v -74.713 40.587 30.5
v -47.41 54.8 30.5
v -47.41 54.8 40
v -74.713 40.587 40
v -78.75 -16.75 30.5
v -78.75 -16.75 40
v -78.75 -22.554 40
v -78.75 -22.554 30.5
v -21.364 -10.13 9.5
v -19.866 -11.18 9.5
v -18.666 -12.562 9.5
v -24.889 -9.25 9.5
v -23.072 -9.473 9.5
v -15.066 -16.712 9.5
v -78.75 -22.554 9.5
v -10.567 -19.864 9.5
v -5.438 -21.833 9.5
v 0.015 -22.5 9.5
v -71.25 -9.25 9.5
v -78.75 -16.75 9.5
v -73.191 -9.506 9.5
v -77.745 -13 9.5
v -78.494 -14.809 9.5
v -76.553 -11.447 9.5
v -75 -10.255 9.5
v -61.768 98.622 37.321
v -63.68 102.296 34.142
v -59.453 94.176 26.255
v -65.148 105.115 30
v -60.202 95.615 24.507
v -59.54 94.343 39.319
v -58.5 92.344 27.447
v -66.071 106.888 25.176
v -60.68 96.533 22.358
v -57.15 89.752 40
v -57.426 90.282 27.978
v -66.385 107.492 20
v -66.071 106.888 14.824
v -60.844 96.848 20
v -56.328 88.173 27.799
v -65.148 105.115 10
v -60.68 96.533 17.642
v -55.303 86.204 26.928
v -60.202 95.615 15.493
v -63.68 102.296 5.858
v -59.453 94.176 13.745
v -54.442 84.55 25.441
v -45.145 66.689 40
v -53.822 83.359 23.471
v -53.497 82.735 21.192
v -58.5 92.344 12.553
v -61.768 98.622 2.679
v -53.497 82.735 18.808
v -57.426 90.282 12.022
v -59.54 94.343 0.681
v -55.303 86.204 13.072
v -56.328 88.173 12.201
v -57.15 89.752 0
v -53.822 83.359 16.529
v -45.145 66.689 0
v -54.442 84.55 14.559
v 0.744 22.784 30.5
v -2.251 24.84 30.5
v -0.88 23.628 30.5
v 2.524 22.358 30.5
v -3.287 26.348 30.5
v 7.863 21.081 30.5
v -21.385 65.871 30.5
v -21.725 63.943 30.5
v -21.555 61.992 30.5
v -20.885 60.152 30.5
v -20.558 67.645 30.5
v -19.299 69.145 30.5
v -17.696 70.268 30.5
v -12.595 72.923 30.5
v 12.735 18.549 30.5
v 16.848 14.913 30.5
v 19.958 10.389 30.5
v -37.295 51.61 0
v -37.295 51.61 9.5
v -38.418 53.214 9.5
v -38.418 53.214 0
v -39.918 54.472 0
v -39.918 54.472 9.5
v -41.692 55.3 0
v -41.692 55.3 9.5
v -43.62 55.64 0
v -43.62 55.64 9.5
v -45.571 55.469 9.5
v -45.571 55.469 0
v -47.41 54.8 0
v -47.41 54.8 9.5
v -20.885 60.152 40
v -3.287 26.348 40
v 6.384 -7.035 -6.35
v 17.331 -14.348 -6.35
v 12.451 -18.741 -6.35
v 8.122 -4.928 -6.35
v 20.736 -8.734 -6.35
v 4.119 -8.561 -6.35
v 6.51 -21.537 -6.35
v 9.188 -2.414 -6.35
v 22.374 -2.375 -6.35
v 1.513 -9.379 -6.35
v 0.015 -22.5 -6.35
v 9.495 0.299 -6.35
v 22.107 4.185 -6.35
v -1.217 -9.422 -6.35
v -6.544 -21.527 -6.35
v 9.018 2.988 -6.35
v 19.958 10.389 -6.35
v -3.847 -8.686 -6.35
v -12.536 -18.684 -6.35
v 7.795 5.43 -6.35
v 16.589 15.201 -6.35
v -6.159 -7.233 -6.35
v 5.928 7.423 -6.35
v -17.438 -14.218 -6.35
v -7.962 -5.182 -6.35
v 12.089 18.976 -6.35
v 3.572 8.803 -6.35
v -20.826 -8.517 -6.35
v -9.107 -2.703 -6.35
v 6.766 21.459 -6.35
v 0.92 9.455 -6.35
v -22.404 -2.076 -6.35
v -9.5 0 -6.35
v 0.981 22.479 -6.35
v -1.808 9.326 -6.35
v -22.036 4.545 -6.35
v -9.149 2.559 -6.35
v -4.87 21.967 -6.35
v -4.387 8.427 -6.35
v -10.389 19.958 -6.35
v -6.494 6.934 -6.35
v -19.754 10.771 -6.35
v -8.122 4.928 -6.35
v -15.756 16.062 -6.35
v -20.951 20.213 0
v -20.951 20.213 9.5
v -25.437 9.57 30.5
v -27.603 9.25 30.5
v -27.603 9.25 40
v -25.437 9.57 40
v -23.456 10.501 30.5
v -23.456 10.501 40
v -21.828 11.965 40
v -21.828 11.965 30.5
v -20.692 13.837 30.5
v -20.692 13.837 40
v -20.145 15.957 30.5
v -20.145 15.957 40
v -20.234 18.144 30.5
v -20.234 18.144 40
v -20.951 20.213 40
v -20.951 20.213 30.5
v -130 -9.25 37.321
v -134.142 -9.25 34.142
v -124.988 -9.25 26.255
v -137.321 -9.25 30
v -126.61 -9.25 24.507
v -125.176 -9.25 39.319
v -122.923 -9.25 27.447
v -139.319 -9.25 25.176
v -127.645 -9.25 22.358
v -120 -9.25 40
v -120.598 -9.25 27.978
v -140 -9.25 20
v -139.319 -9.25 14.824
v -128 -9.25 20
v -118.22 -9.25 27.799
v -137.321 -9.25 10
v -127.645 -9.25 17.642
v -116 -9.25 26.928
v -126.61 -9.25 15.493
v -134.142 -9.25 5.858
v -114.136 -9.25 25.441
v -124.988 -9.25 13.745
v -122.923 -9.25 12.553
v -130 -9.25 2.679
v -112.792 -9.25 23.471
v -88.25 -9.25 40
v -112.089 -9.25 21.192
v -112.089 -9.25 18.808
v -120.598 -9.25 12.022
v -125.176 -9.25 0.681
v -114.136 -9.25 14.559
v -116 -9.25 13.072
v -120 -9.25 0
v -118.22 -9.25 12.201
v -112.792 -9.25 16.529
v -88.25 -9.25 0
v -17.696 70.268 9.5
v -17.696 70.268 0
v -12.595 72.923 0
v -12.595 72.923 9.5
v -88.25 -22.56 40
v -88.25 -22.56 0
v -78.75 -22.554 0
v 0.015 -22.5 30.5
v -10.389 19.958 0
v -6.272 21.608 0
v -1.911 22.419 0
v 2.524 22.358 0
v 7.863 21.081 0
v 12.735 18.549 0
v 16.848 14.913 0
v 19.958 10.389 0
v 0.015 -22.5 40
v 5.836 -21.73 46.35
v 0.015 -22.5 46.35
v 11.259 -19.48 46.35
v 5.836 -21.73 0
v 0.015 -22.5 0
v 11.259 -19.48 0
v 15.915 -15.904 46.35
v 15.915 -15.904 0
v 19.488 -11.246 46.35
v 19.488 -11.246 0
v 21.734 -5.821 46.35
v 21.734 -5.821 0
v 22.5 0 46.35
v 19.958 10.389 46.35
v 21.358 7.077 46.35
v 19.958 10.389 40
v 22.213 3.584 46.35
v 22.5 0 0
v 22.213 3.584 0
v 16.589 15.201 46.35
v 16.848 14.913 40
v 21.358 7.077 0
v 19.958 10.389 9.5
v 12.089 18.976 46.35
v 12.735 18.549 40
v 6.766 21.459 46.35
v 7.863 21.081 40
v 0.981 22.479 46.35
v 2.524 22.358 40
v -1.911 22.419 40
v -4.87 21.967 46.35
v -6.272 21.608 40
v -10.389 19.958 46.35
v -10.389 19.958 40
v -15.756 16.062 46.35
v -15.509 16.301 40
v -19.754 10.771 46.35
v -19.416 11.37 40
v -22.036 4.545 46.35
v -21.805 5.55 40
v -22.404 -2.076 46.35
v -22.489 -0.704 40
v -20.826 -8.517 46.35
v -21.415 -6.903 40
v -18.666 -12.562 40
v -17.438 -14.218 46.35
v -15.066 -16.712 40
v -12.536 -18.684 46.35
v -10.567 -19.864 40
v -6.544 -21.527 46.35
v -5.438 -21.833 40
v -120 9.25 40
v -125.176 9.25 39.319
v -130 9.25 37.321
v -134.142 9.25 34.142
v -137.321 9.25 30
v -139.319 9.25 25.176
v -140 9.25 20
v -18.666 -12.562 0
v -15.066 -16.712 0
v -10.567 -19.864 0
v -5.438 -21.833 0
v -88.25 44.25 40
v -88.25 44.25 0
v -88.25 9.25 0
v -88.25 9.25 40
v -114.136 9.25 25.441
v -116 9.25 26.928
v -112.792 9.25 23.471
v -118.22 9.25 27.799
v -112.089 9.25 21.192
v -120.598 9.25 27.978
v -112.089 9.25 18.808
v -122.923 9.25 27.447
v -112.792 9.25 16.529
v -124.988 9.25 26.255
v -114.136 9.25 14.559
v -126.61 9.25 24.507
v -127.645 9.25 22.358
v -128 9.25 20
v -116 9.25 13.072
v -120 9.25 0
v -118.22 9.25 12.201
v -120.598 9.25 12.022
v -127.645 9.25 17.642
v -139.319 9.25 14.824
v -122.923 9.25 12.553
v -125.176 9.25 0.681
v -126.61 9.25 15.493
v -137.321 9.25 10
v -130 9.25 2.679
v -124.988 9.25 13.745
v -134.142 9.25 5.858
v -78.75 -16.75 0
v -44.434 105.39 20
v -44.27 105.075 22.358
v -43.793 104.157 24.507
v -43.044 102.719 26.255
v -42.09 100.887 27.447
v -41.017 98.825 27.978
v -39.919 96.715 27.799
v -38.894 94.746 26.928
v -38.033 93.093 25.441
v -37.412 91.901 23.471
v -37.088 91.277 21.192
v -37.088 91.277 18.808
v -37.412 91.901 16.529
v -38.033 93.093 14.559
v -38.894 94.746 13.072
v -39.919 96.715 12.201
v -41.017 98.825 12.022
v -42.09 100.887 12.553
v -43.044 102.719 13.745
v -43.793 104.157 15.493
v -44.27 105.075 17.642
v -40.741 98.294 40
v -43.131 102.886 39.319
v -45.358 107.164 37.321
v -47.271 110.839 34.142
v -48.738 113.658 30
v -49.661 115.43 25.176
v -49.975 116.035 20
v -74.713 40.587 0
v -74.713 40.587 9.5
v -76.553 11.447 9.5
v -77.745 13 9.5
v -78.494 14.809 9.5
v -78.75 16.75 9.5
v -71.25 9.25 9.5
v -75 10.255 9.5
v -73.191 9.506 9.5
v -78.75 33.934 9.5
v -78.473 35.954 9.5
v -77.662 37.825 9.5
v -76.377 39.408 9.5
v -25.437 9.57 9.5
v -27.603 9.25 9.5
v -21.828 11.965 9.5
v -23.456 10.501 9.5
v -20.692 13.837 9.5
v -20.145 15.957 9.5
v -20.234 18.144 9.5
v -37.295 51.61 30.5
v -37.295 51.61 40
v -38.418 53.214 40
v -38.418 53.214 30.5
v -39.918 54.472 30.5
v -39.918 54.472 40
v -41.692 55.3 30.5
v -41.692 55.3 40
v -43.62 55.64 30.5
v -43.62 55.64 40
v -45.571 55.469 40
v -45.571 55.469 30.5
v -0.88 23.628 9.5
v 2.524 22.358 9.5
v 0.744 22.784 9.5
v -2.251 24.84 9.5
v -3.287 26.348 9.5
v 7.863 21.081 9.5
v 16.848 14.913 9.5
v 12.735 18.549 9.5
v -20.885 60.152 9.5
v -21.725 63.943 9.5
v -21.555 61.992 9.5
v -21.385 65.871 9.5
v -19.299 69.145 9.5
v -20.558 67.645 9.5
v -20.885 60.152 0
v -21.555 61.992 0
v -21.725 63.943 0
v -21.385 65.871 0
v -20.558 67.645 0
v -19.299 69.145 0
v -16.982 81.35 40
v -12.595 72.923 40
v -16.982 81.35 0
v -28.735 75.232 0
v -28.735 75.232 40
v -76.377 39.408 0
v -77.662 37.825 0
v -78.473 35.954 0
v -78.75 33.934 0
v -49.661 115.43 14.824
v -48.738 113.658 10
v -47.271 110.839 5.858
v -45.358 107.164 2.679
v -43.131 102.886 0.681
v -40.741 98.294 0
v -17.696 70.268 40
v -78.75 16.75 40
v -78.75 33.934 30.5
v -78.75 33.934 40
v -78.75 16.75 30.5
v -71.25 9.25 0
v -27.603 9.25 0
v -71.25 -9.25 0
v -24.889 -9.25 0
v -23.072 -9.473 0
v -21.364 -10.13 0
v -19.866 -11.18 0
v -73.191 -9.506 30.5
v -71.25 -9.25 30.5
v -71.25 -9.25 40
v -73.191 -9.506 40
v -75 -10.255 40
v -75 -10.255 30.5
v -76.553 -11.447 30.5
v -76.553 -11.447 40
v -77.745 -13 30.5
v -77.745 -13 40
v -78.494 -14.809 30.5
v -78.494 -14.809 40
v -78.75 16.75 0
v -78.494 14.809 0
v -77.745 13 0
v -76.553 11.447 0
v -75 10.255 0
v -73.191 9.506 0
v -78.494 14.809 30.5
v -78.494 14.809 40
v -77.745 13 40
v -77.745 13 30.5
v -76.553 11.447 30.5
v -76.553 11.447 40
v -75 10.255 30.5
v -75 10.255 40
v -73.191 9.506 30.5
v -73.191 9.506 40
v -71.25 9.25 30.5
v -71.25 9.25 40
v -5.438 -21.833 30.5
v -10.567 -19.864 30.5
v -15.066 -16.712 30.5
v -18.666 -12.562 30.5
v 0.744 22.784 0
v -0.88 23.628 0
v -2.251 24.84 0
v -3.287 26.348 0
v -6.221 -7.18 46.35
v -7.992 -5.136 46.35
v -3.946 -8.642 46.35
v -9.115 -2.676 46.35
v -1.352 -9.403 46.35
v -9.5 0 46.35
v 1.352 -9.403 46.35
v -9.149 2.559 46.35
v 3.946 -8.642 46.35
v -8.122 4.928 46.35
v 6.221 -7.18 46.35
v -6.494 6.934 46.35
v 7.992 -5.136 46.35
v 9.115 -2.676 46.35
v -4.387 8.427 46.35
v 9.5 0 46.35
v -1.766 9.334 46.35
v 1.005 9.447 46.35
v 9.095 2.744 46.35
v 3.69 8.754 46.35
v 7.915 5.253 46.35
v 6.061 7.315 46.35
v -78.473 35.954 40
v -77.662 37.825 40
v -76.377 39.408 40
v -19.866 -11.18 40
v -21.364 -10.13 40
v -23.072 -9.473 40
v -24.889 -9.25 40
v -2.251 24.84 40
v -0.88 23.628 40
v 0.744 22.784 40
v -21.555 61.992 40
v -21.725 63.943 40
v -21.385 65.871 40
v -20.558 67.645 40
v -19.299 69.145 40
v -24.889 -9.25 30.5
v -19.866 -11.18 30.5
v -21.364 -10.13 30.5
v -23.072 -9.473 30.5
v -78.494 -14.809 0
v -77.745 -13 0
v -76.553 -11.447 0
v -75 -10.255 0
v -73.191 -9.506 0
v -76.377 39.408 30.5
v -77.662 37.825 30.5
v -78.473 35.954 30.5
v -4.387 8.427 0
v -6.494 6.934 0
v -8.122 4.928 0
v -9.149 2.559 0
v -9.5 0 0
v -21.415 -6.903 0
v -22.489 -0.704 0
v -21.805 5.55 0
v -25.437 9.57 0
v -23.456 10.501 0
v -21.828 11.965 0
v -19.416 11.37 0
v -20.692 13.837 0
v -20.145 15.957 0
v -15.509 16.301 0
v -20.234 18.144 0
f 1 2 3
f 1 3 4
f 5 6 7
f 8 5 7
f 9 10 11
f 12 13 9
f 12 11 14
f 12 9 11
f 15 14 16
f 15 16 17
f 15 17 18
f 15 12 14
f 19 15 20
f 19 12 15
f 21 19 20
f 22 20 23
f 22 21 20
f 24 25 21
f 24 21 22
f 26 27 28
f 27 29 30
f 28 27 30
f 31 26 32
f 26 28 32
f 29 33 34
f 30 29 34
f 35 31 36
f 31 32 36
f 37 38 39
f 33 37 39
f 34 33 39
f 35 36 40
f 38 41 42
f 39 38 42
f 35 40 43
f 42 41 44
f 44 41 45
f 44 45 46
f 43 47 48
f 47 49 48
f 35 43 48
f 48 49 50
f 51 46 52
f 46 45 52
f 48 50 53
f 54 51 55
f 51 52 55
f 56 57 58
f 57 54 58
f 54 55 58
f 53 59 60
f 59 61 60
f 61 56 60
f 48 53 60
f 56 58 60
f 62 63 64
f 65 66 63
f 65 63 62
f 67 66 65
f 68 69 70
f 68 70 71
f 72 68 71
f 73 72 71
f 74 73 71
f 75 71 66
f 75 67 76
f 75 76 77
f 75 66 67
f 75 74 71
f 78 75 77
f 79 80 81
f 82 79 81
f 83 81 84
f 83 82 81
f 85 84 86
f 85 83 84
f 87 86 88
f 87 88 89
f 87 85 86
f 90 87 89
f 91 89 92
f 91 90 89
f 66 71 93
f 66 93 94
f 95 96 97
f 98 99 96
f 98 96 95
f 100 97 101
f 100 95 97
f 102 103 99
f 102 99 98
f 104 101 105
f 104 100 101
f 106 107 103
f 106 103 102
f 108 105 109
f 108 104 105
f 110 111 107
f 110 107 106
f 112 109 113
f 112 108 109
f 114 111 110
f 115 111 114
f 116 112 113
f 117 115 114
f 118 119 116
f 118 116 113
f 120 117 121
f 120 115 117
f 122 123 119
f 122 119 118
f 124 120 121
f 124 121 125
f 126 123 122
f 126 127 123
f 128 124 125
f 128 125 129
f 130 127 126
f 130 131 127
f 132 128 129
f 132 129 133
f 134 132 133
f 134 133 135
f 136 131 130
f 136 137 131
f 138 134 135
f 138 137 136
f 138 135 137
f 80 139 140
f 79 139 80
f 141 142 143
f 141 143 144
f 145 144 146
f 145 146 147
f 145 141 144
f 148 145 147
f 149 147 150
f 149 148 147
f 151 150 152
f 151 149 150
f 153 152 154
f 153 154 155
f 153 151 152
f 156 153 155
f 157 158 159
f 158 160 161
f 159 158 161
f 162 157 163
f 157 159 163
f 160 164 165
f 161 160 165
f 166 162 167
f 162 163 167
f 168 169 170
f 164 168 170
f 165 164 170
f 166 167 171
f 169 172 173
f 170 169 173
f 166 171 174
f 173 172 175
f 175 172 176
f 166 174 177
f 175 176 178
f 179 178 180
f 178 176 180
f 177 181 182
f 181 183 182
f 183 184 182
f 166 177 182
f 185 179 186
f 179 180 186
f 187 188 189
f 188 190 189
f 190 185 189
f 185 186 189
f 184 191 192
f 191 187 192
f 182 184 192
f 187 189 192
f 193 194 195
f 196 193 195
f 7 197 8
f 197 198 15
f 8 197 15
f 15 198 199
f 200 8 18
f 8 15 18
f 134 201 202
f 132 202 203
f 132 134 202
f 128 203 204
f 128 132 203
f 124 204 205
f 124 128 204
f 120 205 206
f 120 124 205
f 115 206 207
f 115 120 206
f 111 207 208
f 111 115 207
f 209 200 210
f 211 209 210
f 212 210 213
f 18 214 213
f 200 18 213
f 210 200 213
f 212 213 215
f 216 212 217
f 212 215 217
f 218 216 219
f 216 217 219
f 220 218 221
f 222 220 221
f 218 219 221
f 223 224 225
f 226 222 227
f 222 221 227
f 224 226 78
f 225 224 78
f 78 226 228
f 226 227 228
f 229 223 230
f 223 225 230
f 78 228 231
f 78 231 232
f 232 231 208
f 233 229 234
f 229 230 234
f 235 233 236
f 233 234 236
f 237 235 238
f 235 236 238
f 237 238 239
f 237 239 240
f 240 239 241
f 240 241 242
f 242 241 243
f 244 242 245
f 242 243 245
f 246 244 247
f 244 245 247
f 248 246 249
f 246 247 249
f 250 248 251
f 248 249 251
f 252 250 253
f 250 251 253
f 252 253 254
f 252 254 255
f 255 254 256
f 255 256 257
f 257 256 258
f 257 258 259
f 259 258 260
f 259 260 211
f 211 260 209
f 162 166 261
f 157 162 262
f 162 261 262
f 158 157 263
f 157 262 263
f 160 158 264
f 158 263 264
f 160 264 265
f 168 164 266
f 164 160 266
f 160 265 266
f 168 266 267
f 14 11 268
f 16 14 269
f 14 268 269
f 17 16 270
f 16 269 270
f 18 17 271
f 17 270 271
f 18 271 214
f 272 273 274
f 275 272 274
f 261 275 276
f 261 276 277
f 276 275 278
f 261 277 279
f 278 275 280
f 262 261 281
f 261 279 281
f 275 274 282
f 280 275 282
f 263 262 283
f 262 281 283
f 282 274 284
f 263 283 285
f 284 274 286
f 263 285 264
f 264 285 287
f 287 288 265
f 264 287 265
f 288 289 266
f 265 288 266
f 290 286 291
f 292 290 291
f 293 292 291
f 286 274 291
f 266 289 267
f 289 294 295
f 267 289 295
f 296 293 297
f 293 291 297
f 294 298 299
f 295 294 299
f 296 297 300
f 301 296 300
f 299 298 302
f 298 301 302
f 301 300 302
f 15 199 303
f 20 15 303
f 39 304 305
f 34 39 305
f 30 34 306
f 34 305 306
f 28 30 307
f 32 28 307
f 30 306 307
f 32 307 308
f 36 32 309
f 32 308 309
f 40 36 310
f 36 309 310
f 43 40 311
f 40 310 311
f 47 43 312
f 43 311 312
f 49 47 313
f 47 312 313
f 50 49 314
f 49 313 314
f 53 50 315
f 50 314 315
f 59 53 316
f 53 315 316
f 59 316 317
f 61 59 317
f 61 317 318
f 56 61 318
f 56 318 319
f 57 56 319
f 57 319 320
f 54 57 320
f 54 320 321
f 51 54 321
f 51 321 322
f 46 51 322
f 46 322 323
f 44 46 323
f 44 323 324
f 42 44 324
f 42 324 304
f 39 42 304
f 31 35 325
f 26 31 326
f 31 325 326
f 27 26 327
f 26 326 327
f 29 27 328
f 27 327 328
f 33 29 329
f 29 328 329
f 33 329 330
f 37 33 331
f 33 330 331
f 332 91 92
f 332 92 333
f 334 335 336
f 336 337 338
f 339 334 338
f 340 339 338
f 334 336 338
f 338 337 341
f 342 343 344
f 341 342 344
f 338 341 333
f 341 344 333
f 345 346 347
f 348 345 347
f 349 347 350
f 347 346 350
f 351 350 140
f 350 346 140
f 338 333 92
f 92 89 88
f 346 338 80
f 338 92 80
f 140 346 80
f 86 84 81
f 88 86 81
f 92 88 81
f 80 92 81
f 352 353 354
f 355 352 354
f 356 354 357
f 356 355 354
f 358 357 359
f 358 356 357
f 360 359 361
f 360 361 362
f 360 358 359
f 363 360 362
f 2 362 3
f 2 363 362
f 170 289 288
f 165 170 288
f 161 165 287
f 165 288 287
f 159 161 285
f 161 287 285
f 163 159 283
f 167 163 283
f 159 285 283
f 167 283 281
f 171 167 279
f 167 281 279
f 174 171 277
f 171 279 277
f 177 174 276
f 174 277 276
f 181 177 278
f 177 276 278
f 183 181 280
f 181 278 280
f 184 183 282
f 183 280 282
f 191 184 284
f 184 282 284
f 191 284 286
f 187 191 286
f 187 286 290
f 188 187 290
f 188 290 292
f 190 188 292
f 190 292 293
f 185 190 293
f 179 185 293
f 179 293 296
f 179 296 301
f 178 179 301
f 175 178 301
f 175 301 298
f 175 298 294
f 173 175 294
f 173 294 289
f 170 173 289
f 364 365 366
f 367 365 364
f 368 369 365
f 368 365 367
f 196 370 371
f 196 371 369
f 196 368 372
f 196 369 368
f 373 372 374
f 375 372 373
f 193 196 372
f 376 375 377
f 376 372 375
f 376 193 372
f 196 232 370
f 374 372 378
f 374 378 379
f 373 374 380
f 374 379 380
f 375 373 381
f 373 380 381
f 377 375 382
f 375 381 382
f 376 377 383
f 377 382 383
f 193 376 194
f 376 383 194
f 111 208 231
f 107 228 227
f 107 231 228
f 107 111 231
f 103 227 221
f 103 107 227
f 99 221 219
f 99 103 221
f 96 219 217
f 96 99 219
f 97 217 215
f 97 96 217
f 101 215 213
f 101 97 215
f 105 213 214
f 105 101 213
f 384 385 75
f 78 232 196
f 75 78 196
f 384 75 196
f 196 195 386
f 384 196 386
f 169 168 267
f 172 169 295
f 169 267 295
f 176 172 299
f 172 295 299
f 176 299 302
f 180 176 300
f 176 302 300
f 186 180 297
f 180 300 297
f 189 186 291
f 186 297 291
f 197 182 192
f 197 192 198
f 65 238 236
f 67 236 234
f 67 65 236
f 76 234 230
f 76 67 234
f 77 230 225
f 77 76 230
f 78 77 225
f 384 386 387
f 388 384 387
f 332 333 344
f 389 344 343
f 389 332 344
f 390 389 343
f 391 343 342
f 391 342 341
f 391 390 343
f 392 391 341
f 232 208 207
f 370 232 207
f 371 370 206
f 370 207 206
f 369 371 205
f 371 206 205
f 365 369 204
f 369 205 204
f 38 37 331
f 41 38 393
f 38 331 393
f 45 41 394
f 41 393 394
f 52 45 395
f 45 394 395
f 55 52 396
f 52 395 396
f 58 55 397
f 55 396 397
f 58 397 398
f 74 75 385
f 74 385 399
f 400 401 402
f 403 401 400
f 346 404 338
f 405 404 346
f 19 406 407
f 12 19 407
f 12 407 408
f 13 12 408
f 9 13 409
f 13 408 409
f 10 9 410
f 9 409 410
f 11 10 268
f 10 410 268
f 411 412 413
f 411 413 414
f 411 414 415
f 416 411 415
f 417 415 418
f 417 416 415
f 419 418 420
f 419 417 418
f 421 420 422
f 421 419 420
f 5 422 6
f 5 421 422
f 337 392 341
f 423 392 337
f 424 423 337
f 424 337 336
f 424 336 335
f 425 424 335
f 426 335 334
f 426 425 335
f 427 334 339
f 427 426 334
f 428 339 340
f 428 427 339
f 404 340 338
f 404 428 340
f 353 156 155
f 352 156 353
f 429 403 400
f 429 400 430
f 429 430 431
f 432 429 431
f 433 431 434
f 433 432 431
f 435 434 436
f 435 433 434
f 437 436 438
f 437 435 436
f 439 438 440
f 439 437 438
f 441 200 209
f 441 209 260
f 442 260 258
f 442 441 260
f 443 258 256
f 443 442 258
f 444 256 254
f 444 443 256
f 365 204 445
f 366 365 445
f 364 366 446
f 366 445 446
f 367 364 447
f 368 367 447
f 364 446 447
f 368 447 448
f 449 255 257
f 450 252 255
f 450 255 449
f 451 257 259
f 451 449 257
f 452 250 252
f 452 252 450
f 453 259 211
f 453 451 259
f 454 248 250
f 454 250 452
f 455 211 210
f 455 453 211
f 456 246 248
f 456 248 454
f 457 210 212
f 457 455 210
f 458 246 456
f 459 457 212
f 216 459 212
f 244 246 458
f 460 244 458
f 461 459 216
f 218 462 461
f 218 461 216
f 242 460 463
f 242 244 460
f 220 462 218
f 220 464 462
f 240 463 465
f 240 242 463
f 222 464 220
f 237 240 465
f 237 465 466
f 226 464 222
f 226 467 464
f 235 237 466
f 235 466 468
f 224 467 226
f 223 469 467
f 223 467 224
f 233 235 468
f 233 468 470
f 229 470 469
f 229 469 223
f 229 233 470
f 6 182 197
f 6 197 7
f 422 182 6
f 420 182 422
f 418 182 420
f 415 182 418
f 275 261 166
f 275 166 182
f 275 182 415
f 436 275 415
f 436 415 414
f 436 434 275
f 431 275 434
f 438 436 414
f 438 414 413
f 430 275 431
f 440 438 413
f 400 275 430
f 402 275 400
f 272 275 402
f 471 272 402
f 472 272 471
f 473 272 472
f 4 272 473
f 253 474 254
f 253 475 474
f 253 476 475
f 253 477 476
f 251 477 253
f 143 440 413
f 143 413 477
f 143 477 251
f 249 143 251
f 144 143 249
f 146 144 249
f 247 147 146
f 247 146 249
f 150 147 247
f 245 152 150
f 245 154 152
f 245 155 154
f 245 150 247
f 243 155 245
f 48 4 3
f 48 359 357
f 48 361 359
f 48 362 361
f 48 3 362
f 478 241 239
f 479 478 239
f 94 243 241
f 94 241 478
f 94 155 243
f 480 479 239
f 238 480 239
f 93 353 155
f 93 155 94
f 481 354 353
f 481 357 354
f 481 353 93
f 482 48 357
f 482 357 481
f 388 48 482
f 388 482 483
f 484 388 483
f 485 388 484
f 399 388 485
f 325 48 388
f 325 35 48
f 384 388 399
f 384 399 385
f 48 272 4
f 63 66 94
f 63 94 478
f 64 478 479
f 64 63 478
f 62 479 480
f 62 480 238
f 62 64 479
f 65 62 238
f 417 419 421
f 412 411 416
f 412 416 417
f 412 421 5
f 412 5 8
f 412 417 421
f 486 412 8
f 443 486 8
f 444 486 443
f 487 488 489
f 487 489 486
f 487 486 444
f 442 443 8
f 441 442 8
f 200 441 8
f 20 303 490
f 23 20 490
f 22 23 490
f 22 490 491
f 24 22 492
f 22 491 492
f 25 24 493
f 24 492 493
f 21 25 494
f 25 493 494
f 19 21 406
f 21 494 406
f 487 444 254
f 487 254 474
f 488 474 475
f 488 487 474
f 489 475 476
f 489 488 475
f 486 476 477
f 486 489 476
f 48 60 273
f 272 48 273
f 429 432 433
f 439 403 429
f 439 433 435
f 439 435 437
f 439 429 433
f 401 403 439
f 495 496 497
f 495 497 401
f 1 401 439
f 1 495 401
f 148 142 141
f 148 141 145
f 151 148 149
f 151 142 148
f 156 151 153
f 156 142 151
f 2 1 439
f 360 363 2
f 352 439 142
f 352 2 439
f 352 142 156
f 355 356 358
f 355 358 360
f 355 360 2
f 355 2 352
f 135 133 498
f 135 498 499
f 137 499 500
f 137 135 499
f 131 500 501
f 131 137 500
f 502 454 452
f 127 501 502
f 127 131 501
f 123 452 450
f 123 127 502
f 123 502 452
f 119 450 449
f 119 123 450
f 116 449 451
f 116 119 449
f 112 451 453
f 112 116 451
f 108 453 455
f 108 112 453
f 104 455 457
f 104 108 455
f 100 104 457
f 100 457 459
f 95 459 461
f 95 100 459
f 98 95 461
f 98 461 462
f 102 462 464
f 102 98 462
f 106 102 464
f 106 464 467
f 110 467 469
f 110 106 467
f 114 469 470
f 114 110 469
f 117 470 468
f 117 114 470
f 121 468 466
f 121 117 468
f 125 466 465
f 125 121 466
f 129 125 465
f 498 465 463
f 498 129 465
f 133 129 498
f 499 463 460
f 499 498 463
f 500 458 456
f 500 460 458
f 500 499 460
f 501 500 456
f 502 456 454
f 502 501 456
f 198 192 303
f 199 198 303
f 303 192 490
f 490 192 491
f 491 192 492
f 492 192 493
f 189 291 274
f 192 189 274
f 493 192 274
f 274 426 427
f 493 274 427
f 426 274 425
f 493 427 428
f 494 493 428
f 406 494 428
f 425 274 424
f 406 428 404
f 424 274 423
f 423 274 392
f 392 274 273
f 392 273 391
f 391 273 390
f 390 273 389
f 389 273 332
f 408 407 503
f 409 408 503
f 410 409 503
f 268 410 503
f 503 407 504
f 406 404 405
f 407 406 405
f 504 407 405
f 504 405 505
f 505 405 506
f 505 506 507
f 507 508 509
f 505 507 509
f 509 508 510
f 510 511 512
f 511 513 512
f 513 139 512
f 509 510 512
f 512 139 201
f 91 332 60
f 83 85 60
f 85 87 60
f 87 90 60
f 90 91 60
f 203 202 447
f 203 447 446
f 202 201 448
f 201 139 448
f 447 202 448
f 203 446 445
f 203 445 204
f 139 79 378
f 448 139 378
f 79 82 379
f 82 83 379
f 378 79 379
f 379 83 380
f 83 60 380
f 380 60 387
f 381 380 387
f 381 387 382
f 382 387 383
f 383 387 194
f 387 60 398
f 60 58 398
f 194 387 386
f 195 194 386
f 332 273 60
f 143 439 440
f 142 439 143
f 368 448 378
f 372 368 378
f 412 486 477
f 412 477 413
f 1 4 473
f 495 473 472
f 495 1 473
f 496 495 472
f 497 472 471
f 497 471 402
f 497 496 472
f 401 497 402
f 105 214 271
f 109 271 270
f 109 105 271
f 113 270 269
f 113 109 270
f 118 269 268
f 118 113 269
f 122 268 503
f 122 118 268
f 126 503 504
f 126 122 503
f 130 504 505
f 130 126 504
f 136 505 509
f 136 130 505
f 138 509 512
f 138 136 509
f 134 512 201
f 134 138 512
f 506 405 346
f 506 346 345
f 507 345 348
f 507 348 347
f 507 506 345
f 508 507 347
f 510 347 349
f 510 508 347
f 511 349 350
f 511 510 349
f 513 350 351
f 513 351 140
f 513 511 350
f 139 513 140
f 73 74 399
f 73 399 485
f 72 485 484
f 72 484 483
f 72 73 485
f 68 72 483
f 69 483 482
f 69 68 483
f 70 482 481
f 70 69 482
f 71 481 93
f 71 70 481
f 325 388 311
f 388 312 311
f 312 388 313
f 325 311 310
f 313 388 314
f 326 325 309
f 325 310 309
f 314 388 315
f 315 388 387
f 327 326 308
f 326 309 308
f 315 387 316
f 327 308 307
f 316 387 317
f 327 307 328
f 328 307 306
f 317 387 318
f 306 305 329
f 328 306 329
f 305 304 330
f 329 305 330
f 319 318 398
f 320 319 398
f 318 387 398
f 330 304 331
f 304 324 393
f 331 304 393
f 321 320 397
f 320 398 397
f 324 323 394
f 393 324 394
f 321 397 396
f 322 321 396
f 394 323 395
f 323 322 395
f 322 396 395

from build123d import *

# Parameters (mm, degrees)
BOSS_EXTRU_1_DEPTH      = 40
ESQUISSE2_R             = 8
ENL_V_MAT_EXTRU_1_DEPTH = 190.883457354
ESQUISSE3_R             = 8
ENL_V_MAT_EXTRU_2_DEPTH = 181.562836456
BOSS_EXTRU_2_DEPTH      = 6.35
BOSS_EXTRU_3_START      = 6.35
BOSS_EXTRU_3_DEPTH      = 6.35
ENL_V_START             = -9.5
ENL_V_MAT_EXTRU_3_DEPTH = 9.5
ENL_V_MAT_EXTRU_6_DEPTH = 9.5


with BuildPart() as part:
    # Esquisse1 → Boss.-Extru.1 (new body)
    with BuildSketch(Plane.XY):
        with BuildLine():
            ThreePointArc((-10.389343798, 19.957743747), (6.765880489, 21.458631392), (19.957743747, 10.389343798))
            Line((19.957743747, 10.389343798), (-16.981934979, 81.349806406))
            Line((-16.981934979, 81.349806406), (-28.734828519, 75.231637281))
            Line((-28.734828519, 75.231637281), (-49.975475061, 116.034539653))
            Line((-49.975475061, 116.034539653), (-58.180325268, 111.76336498))
            Line((-58.180325268, 111.76336498), (-10.389343798, 19.957743747))
        make_face()
        with BuildLine():
            ThreePointArc((-22.5, 0), (-19.23551709, 11.672398309), (-10.389343798, 19.957743747))
            Line((-10.389343798, 19.957743747), (-58.180325268, 111.76336498))
            Line((-58.180325268, 111.76336498), (-66.385175475, 107.492190308))
            Line((-66.385175475, 107.492190308), (-45.144528933, 66.689287936))
            Line((-45.144528933, 66.689287936), (-88.25, 44.25))
            Line((-88.25, 44.25), (-88.25, 9.25))
            Line((-88.25, 9.25), (-140, 9.25))
            Line((-140, 9.25), (-140, 0))
            Line((-140, 0), (-22.5, 0))
        make_face()
        with BuildLine():
            Line((-88.25, -22.560492565), (0.015421683, -22.499994715))
            ThreePointArc((0.015421683, -22.499994715), (-15.904449254, -15.915354031), (-22.5, 0))
            Line((-22.5, 0), (-140, 0))
            Line((-140, 0), (-140, -9.25))
            Line((-140, -9.25), (-88.25, -9.25))
            Line((-88.25, -9.25), (-88.25, -22.560492565))
        make_face()
        with BuildLine():
            ThreePointArc((22.5, 0), (21.855196571, 5.347932577), (19.957743747, 10.389343798))
            ThreePointArc((19.957743747, 10.389343798), (6.765880489, 21.458631392), (-10.389343798, 19.957743747))
            Line((-10.389343798, 19.957743747), (-4.386611826, 8.426602915))
            ThreePointArc((-4.386611826, 8.426602915), (4.928345953, 8.121662771), (9.5, 0))
            ThreePointArc((9.5, 0), (0, -9.5), (-9.5, 0))
            Line((-9.5, 0), (-22.5, 0))
            ThreePointArc((-22.5, 0), (-15.904449254, -15.915354031), (0.015421683, -22.499994715))
            ThreePointArc((0.015421683, -22.499994715), (15.915354031, -15.904449254), (22.5, 0))
        make_face()
        with BuildLine():
            Line((-4.386611826, 8.426602915), (-10.389343798, 19.957743747))
            ThreePointArc((-10.389343798, 19.957743747), (-19.23551709, 11.672398309), (-22.5, 0))
            Line((-22.5, 0), (-9.5, 0))
            ThreePointArc((-9.5, 0), (-8.121662771, 4.928345953), (-4.386611826, 8.426602915))
        make_face()
        with BuildLine():
            ThreePointArc((22.5, 0), (21.855196571, 5.347932577), (19.957743747, 10.389343798))
            ThreePointArc((19.957743747, 10.389343798), (6.765880489, 21.458631392), (-10.389343798, 19.957743747))
            Line((-10.389343798, 19.957743747), (-4.386611826, 8.426602915))
            ThreePointArc((-4.386611826, 8.426602915), (4.928345953, 8.121662771), (9.5, 0))
            ThreePointArc((9.5, 0), (0, -9.5), (-9.5, 0))
            Line((-9.5, 0), (-22.5, 0))
            ThreePointArc((-22.5, 0), (-15.904449254, -15.915354031), (0.015421683, -22.499994715))
            ThreePointArc((0.015421683, -22.499994715), (15.915354031, -15.904449254), (22.5, 0))
        make_face()
        with BuildLine():
            Line((-4.386611826, 8.426602915), (-10.389343798, 19.957743747))
            ThreePointArc((-10.389343798, 19.957743747), (-19.23551709, 11.672398309), (-22.5, 0))
            Line((-22.5, 0), (-9.5, 0))
            ThreePointArc((-9.5, 0), (-8.121662771, 4.928345953), (-4.386611826, 8.426602915))
        make_face()
    extrude(amount=BOSS_EXTRU_1_DEPTH)

    # Esquisse2 → Enlèv. mat.-Extru.1 (cut, through all)
    with BuildSketch(Plane(origin=(8.204850207, 4.271174672, 0), x_dir=(0, 0, -1), z_dir=(0.8870108331782228, 0.4617486132350319, 0))):
        with Locations(Location((-20, 106, 0), (0, 0, 90))):
            Circle(ESQUISSE2_R)
        with BuildLine():
            ThreePointArc((-40, 106), (-34.142135624, 120.142135624), (-20, 126))
            Line((-20, 126), (-40, 126))
            Line((-40, 126), (-40, 106))
        make_face()
        with BuildLine():
            ThreePointArc((-20, 126), (-5.857864376, 120.142135624), (0, 106))
            Line((0, 106), (0, 126))
            Line((0, 126), (-20, 126))
        make_face()
    extrude(amount=-ENL_V_MAT_EXTRU_1_DEPTH, mode=Mode.SUBTRACT)

    # Esquisse3 → Enlèv. mat.-Extru.2 (cut, through all)
    with BuildSketch(Plane(origin=(0, 9.25, 0), x_dir=(1, 0, 0), z_dir=(0, 1, 0))):
        with BuildLine():
            ThreePointArc((-140, -20), (-134.142135624, -5.857864376), (-120, 0))
            Line((-120, 0), (-140, 0))
            Line((-140, 0), (-140, -20))
        make_face()
        with BuildLine():
            ThreePointArc((-120, -40), (-134.142135624, -34.142135624), (-140, -20))
            Line((-140, -20), (-140, -40))
            Line((-140, -40), (-120, -40))
        make_face()
        with Locations(Location((-120, -20, 0), (0, 0, 180))):
            Circle(ESQUISSE3_R)
    extrude(amount=-ENL_V_MAT_EXTRU_2_DEPTH, mode=Mode.SUBTRACT)

    # Esquisse4 → Boss.-Extru.2 (add)
    with BuildSketch(Plane.XY.offset(40)):
        with BuildLine():
            ThreePointArc((22.5, 0), (21.855196571, 5.347932577), (19.957743747, 10.389343798))
            ThreePointArc((19.957743747, 10.389343798), (6.765880489, 21.458631392), (-10.389343798, 19.957743747))
            Line((-10.389343798, 19.957743747), (-4.386611826, 8.426602915))
            ThreePointArc((-4.386611826, 8.426602915), (4.928345953, 8.121662771), (9.5, 0))
            ThreePointArc((9.5, 0), (0, -9.5), (-9.5, 0))
            Line((-9.5, 0), (-22.5, 0))
            ThreePointArc((-22.5, 0), (-15.904449254, -15.915354031), (0.015421683, -22.499994715))
            ThreePointArc((0.015421683, -22.499994715), (15.915354031, -15.904449254), (22.5, 0))
        make_face()
        with BuildLine():
            ThreePointArc((22.5, 0), (21.855196571, 5.347932577), (19.957743747, 10.389343798))
            ThreePointArc((19.957743747, 10.389343798), (6.765880489, 21.458631392), (-10.389343798, 19.957743747))
            Line((-10.389343798, 19.957743747), (-4.386611826, 8.426602915))
            ThreePointArc((-4.386611826, 8.426602915), (4.928345953, 8.121662771), (9.5, 0))
            ThreePointArc((9.5, 0), (0, -9.5), (-9.5, 0))
            Line((-9.5, 0), (-22.5, 0))
            ThreePointArc((-22.5, 0), (-15.904449254, -15.915354031), (0.015421683, -22.499994715))
            ThreePointArc((0.015421683, -22.499994715), (15.915354031, -15.904449254), (22.5, 0))
        make_face()
        with BuildLine():
            Line((-4.386611826, 8.426602915), (-10.389343798, 19.957743747))
            ThreePointArc((-10.389343798, 19.957743747), (-19.23551709, 11.672398309), (-22.5, 0))
            Line((-22.5, 0), (-9.5, 0))
            ThreePointArc((-9.5, 0), (-8.121662771, 4.928345953), (-4.386611826, 8.426602915))
        make_face()
    extrude(amount=BOSS_EXTRU_2_DEPTH)

    # Esquisse5 → Boss.-Extru.3 (add)
    with BuildSketch(Plane(origin=(0, 0, 0), x_dir=(-1, 0, 0), z_dir=(0, 0, -1)).offset(BOSS_EXTRU_3_START)):
        with BuildLine():
            ThreePointArc((10.389343798, 19.957743747), (-6.765880489, 21.458631392), (-19.957743747, 10.389343798))
            ThreePointArc((-19.957743747, 10.389343798), (-19.239516139, -11.665805533), (-0.015421683, -22.499994715))
            ThreePointArc((-0.015421683, -22.499994715), (15.904449254, -15.915354031), (22.5, 0))
            Line((22.5, 0), (9.5, 0))
            ThreePointArc((9.5, 0), (-8.121662771, -4.928345953), (4.386611826, 8.426602915))
            Line((4.386611826, 8.426602915), (10.389343798, 19.957743747))
        make_face()
        with BuildLine():
            ThreePointArc((22.5, 0), (19.23551709, 11.672398309), (10.389343798, 19.957743747))
            Line((10.389343798, 19.957743747), (4.386611826, 8.426602915))
            ThreePointArc((4.386611826, 8.426602915), (8.121662771, 4.928345953), (9.5, 0))
            Line((9.5, 0), (22.5, 0))
        make_face()
        with BuildLine():
            ThreePointArc((10.389343798, 19.957743747), (-6.765880489, 21.458631392), (-19.957743747, 10.389343798))
            ThreePointArc((-19.957743747, 10.389343798), (-19.239516139, -11.665805533), (-0.015421683, -22.499994715))
            ThreePointArc((-0.015421683, -22.499994715), (15.904449254, -15.915354031), (22.5, 0))
            Line((22.5, 0), (9.5, 0))
            ThreePointArc((9.5, 0), (-8.121662771, -4.928345953), (4.386611826, 8.426602915))
            Line((4.386611826, 8.426602915), (10.389343798, 19.957743747))
        make_face()
    extrude(amount=-BOSS_EXTRU_3_DEPTH)

    # Esquisse6 → Enlèv. mat.-Extru.3 (cut)
    with BuildSketch(Plane.XY.offset(40).offset(ENL_V_START)):
        with BuildLine():
            Line((19.957743747, 10.389343798), (-12.595323154, 72.923203491))
            Line((-12.595323154, 72.923203491), (-17.695635444, 70.268148965))
            ThreePointArc((-17.695635444, 70.268148965), (-21.385397976, 65.870861212), (-20.885102094, 60.152453117))
            Line((-20.885102094, 60.152453117), (-3.287380782, 26.347545001))
            ThreePointArc((-3.287380782, 26.347545001), (-0.879642567, 23.627512536), (2.52390035, 22.3579947))
            ThreePointArc((2.52390035, 22.3579947), (12.734529101, 18.549441193), (19.957743747, 10.389343798))
        make_face()
        with BuildLine():
            Line((-78.75, -22.553981187), (0.015421683, -22.499994715))
            ThreePointArc((0.015421683, -22.499994715), (-10.566597122, -19.864466398), (-18.666376021, -12.5625))
            ThreePointArc((-18.666376021, -12.5625), (-21.364033316, -10.129718662), (-24.888501361, -9.25))
            Line((-24.888501361, -9.25), (-71.25, -9.25))
            ThreePointArc((-71.25, -9.25), (-76.553300859, -11.446699141), (-78.75, -16.75))
            Line((-78.75, -16.75), (-78.75, -22.553981187))
        make_face()
        with BuildLine():
            Line((-20.950564458, 20.213114599), (-37.294802508, 51.610103772))
            ThreePointArc((-37.294802508, 51.610103772), (-41.69209026, 55.299866303), (-47.410498356, 54.799570422))
            Line((-47.410498356, 54.799570422), (-74.713114599, 40.586728011))
            ThreePointArc((-74.713114599, 40.586728011), (-77.66183903, 37.824946199), (-78.75, 33.934146763))
            Line((-78.75, 33.934146763), (-78.75, 16.75))
            ThreePointArc((-78.75, 16.75), (-76.553300859, 11.446699141), (-71.25, 9.25))
            Line((-71.25, 9.25), (-27.603145707, 9.25))
            ThreePointArc((-27.603145707, 9.25), (-21.191306677, 12.859200564), (-20.950564458, 20.213114599))
        make_face()
    extrude(amount=ENL_V_MAT_EXTRU_3_DEPTH, mode=Mode.SUBTRACT)

    # Esquisse9 → Enlèv. mat.-Extru.6 (cut)
    with BuildSketch(Plane(origin=(0, 0, 0), x_dir=(-1, 0, 0), z_dir=(0, 0, -1))):
        with BuildLine():
            ThreePointArc((-19.957743747, 10.389343798), (-12.734529101, 18.549441193), (-2.52390035, 22.3579947))
            ThreePointArc((-2.52390035, 22.3579947), (0.879642567, 23.627512536), (3.287380782, 26.347545001))
            Line((3.287380782, 26.347545001), (20.885102094, 60.152453117))
            ThreePointArc((20.885102094, 60.152453117), (21.385397976, 65.870861212), (17.695635444, 70.268148965))
            Line((17.695635444, 70.268148965), (12.595323154, 72.923203491))
            Line((12.595323154, 72.923203491), (-19.957743747, 10.389343798))
        make_face()
        with BuildLine():
            Line((47.410498356, 54.799570422), (74.713114599, 40.586728011))
            ThreePointArc((74.713114599, 40.586728011), (77.66183903, 37.824946199), (78.75, 33.934146763))
            Line((78.75, 33.934146763), (78.75, 16.75))
            ThreePointArc((78.75, 16.75), (76.553300859, 11.446699141), (71.25, 9.25))
            Line((71.25, 9.25), (27.603145707, 9.25))
            ThreePointArc((27.603145707, 9.25), (21.191306677, 12.859200564), (20.950564458, 20.213114599))
            Line((20.950564458, 20.213114599), (37.294802508, 51.610103772))
            ThreePointArc((37.294802508, 51.610103772), (41.69209026, 55.299866303), (47.410498356, 54.799570422))
        make_face()
        with BuildLine():
            Line((71.25, -9.25), (24.888501361, -9.25))
            ThreePointArc((24.888501361, -9.25), (21.364033316, -10.129718662), (18.666376021, -12.5625))
            ThreePointArc((18.666376021, -12.5625), (10.566597122, -19.864466398), (-0.015421683, -22.499994715))
            Line((-0.015421683, -22.499994715), (78.75, -22.553981187))
            Line((78.75, -22.553981187), (78.75, -16.75))
            ThreePointArc((78.75, -16.75), (76.553300859, -11.446699141), (71.25, -9.25))
        make_face()
    extrude(amount=-ENL_V_MAT_EXTRU_6_DEPTH, mode=Mode.SUBTRACT)


solid = part.part
